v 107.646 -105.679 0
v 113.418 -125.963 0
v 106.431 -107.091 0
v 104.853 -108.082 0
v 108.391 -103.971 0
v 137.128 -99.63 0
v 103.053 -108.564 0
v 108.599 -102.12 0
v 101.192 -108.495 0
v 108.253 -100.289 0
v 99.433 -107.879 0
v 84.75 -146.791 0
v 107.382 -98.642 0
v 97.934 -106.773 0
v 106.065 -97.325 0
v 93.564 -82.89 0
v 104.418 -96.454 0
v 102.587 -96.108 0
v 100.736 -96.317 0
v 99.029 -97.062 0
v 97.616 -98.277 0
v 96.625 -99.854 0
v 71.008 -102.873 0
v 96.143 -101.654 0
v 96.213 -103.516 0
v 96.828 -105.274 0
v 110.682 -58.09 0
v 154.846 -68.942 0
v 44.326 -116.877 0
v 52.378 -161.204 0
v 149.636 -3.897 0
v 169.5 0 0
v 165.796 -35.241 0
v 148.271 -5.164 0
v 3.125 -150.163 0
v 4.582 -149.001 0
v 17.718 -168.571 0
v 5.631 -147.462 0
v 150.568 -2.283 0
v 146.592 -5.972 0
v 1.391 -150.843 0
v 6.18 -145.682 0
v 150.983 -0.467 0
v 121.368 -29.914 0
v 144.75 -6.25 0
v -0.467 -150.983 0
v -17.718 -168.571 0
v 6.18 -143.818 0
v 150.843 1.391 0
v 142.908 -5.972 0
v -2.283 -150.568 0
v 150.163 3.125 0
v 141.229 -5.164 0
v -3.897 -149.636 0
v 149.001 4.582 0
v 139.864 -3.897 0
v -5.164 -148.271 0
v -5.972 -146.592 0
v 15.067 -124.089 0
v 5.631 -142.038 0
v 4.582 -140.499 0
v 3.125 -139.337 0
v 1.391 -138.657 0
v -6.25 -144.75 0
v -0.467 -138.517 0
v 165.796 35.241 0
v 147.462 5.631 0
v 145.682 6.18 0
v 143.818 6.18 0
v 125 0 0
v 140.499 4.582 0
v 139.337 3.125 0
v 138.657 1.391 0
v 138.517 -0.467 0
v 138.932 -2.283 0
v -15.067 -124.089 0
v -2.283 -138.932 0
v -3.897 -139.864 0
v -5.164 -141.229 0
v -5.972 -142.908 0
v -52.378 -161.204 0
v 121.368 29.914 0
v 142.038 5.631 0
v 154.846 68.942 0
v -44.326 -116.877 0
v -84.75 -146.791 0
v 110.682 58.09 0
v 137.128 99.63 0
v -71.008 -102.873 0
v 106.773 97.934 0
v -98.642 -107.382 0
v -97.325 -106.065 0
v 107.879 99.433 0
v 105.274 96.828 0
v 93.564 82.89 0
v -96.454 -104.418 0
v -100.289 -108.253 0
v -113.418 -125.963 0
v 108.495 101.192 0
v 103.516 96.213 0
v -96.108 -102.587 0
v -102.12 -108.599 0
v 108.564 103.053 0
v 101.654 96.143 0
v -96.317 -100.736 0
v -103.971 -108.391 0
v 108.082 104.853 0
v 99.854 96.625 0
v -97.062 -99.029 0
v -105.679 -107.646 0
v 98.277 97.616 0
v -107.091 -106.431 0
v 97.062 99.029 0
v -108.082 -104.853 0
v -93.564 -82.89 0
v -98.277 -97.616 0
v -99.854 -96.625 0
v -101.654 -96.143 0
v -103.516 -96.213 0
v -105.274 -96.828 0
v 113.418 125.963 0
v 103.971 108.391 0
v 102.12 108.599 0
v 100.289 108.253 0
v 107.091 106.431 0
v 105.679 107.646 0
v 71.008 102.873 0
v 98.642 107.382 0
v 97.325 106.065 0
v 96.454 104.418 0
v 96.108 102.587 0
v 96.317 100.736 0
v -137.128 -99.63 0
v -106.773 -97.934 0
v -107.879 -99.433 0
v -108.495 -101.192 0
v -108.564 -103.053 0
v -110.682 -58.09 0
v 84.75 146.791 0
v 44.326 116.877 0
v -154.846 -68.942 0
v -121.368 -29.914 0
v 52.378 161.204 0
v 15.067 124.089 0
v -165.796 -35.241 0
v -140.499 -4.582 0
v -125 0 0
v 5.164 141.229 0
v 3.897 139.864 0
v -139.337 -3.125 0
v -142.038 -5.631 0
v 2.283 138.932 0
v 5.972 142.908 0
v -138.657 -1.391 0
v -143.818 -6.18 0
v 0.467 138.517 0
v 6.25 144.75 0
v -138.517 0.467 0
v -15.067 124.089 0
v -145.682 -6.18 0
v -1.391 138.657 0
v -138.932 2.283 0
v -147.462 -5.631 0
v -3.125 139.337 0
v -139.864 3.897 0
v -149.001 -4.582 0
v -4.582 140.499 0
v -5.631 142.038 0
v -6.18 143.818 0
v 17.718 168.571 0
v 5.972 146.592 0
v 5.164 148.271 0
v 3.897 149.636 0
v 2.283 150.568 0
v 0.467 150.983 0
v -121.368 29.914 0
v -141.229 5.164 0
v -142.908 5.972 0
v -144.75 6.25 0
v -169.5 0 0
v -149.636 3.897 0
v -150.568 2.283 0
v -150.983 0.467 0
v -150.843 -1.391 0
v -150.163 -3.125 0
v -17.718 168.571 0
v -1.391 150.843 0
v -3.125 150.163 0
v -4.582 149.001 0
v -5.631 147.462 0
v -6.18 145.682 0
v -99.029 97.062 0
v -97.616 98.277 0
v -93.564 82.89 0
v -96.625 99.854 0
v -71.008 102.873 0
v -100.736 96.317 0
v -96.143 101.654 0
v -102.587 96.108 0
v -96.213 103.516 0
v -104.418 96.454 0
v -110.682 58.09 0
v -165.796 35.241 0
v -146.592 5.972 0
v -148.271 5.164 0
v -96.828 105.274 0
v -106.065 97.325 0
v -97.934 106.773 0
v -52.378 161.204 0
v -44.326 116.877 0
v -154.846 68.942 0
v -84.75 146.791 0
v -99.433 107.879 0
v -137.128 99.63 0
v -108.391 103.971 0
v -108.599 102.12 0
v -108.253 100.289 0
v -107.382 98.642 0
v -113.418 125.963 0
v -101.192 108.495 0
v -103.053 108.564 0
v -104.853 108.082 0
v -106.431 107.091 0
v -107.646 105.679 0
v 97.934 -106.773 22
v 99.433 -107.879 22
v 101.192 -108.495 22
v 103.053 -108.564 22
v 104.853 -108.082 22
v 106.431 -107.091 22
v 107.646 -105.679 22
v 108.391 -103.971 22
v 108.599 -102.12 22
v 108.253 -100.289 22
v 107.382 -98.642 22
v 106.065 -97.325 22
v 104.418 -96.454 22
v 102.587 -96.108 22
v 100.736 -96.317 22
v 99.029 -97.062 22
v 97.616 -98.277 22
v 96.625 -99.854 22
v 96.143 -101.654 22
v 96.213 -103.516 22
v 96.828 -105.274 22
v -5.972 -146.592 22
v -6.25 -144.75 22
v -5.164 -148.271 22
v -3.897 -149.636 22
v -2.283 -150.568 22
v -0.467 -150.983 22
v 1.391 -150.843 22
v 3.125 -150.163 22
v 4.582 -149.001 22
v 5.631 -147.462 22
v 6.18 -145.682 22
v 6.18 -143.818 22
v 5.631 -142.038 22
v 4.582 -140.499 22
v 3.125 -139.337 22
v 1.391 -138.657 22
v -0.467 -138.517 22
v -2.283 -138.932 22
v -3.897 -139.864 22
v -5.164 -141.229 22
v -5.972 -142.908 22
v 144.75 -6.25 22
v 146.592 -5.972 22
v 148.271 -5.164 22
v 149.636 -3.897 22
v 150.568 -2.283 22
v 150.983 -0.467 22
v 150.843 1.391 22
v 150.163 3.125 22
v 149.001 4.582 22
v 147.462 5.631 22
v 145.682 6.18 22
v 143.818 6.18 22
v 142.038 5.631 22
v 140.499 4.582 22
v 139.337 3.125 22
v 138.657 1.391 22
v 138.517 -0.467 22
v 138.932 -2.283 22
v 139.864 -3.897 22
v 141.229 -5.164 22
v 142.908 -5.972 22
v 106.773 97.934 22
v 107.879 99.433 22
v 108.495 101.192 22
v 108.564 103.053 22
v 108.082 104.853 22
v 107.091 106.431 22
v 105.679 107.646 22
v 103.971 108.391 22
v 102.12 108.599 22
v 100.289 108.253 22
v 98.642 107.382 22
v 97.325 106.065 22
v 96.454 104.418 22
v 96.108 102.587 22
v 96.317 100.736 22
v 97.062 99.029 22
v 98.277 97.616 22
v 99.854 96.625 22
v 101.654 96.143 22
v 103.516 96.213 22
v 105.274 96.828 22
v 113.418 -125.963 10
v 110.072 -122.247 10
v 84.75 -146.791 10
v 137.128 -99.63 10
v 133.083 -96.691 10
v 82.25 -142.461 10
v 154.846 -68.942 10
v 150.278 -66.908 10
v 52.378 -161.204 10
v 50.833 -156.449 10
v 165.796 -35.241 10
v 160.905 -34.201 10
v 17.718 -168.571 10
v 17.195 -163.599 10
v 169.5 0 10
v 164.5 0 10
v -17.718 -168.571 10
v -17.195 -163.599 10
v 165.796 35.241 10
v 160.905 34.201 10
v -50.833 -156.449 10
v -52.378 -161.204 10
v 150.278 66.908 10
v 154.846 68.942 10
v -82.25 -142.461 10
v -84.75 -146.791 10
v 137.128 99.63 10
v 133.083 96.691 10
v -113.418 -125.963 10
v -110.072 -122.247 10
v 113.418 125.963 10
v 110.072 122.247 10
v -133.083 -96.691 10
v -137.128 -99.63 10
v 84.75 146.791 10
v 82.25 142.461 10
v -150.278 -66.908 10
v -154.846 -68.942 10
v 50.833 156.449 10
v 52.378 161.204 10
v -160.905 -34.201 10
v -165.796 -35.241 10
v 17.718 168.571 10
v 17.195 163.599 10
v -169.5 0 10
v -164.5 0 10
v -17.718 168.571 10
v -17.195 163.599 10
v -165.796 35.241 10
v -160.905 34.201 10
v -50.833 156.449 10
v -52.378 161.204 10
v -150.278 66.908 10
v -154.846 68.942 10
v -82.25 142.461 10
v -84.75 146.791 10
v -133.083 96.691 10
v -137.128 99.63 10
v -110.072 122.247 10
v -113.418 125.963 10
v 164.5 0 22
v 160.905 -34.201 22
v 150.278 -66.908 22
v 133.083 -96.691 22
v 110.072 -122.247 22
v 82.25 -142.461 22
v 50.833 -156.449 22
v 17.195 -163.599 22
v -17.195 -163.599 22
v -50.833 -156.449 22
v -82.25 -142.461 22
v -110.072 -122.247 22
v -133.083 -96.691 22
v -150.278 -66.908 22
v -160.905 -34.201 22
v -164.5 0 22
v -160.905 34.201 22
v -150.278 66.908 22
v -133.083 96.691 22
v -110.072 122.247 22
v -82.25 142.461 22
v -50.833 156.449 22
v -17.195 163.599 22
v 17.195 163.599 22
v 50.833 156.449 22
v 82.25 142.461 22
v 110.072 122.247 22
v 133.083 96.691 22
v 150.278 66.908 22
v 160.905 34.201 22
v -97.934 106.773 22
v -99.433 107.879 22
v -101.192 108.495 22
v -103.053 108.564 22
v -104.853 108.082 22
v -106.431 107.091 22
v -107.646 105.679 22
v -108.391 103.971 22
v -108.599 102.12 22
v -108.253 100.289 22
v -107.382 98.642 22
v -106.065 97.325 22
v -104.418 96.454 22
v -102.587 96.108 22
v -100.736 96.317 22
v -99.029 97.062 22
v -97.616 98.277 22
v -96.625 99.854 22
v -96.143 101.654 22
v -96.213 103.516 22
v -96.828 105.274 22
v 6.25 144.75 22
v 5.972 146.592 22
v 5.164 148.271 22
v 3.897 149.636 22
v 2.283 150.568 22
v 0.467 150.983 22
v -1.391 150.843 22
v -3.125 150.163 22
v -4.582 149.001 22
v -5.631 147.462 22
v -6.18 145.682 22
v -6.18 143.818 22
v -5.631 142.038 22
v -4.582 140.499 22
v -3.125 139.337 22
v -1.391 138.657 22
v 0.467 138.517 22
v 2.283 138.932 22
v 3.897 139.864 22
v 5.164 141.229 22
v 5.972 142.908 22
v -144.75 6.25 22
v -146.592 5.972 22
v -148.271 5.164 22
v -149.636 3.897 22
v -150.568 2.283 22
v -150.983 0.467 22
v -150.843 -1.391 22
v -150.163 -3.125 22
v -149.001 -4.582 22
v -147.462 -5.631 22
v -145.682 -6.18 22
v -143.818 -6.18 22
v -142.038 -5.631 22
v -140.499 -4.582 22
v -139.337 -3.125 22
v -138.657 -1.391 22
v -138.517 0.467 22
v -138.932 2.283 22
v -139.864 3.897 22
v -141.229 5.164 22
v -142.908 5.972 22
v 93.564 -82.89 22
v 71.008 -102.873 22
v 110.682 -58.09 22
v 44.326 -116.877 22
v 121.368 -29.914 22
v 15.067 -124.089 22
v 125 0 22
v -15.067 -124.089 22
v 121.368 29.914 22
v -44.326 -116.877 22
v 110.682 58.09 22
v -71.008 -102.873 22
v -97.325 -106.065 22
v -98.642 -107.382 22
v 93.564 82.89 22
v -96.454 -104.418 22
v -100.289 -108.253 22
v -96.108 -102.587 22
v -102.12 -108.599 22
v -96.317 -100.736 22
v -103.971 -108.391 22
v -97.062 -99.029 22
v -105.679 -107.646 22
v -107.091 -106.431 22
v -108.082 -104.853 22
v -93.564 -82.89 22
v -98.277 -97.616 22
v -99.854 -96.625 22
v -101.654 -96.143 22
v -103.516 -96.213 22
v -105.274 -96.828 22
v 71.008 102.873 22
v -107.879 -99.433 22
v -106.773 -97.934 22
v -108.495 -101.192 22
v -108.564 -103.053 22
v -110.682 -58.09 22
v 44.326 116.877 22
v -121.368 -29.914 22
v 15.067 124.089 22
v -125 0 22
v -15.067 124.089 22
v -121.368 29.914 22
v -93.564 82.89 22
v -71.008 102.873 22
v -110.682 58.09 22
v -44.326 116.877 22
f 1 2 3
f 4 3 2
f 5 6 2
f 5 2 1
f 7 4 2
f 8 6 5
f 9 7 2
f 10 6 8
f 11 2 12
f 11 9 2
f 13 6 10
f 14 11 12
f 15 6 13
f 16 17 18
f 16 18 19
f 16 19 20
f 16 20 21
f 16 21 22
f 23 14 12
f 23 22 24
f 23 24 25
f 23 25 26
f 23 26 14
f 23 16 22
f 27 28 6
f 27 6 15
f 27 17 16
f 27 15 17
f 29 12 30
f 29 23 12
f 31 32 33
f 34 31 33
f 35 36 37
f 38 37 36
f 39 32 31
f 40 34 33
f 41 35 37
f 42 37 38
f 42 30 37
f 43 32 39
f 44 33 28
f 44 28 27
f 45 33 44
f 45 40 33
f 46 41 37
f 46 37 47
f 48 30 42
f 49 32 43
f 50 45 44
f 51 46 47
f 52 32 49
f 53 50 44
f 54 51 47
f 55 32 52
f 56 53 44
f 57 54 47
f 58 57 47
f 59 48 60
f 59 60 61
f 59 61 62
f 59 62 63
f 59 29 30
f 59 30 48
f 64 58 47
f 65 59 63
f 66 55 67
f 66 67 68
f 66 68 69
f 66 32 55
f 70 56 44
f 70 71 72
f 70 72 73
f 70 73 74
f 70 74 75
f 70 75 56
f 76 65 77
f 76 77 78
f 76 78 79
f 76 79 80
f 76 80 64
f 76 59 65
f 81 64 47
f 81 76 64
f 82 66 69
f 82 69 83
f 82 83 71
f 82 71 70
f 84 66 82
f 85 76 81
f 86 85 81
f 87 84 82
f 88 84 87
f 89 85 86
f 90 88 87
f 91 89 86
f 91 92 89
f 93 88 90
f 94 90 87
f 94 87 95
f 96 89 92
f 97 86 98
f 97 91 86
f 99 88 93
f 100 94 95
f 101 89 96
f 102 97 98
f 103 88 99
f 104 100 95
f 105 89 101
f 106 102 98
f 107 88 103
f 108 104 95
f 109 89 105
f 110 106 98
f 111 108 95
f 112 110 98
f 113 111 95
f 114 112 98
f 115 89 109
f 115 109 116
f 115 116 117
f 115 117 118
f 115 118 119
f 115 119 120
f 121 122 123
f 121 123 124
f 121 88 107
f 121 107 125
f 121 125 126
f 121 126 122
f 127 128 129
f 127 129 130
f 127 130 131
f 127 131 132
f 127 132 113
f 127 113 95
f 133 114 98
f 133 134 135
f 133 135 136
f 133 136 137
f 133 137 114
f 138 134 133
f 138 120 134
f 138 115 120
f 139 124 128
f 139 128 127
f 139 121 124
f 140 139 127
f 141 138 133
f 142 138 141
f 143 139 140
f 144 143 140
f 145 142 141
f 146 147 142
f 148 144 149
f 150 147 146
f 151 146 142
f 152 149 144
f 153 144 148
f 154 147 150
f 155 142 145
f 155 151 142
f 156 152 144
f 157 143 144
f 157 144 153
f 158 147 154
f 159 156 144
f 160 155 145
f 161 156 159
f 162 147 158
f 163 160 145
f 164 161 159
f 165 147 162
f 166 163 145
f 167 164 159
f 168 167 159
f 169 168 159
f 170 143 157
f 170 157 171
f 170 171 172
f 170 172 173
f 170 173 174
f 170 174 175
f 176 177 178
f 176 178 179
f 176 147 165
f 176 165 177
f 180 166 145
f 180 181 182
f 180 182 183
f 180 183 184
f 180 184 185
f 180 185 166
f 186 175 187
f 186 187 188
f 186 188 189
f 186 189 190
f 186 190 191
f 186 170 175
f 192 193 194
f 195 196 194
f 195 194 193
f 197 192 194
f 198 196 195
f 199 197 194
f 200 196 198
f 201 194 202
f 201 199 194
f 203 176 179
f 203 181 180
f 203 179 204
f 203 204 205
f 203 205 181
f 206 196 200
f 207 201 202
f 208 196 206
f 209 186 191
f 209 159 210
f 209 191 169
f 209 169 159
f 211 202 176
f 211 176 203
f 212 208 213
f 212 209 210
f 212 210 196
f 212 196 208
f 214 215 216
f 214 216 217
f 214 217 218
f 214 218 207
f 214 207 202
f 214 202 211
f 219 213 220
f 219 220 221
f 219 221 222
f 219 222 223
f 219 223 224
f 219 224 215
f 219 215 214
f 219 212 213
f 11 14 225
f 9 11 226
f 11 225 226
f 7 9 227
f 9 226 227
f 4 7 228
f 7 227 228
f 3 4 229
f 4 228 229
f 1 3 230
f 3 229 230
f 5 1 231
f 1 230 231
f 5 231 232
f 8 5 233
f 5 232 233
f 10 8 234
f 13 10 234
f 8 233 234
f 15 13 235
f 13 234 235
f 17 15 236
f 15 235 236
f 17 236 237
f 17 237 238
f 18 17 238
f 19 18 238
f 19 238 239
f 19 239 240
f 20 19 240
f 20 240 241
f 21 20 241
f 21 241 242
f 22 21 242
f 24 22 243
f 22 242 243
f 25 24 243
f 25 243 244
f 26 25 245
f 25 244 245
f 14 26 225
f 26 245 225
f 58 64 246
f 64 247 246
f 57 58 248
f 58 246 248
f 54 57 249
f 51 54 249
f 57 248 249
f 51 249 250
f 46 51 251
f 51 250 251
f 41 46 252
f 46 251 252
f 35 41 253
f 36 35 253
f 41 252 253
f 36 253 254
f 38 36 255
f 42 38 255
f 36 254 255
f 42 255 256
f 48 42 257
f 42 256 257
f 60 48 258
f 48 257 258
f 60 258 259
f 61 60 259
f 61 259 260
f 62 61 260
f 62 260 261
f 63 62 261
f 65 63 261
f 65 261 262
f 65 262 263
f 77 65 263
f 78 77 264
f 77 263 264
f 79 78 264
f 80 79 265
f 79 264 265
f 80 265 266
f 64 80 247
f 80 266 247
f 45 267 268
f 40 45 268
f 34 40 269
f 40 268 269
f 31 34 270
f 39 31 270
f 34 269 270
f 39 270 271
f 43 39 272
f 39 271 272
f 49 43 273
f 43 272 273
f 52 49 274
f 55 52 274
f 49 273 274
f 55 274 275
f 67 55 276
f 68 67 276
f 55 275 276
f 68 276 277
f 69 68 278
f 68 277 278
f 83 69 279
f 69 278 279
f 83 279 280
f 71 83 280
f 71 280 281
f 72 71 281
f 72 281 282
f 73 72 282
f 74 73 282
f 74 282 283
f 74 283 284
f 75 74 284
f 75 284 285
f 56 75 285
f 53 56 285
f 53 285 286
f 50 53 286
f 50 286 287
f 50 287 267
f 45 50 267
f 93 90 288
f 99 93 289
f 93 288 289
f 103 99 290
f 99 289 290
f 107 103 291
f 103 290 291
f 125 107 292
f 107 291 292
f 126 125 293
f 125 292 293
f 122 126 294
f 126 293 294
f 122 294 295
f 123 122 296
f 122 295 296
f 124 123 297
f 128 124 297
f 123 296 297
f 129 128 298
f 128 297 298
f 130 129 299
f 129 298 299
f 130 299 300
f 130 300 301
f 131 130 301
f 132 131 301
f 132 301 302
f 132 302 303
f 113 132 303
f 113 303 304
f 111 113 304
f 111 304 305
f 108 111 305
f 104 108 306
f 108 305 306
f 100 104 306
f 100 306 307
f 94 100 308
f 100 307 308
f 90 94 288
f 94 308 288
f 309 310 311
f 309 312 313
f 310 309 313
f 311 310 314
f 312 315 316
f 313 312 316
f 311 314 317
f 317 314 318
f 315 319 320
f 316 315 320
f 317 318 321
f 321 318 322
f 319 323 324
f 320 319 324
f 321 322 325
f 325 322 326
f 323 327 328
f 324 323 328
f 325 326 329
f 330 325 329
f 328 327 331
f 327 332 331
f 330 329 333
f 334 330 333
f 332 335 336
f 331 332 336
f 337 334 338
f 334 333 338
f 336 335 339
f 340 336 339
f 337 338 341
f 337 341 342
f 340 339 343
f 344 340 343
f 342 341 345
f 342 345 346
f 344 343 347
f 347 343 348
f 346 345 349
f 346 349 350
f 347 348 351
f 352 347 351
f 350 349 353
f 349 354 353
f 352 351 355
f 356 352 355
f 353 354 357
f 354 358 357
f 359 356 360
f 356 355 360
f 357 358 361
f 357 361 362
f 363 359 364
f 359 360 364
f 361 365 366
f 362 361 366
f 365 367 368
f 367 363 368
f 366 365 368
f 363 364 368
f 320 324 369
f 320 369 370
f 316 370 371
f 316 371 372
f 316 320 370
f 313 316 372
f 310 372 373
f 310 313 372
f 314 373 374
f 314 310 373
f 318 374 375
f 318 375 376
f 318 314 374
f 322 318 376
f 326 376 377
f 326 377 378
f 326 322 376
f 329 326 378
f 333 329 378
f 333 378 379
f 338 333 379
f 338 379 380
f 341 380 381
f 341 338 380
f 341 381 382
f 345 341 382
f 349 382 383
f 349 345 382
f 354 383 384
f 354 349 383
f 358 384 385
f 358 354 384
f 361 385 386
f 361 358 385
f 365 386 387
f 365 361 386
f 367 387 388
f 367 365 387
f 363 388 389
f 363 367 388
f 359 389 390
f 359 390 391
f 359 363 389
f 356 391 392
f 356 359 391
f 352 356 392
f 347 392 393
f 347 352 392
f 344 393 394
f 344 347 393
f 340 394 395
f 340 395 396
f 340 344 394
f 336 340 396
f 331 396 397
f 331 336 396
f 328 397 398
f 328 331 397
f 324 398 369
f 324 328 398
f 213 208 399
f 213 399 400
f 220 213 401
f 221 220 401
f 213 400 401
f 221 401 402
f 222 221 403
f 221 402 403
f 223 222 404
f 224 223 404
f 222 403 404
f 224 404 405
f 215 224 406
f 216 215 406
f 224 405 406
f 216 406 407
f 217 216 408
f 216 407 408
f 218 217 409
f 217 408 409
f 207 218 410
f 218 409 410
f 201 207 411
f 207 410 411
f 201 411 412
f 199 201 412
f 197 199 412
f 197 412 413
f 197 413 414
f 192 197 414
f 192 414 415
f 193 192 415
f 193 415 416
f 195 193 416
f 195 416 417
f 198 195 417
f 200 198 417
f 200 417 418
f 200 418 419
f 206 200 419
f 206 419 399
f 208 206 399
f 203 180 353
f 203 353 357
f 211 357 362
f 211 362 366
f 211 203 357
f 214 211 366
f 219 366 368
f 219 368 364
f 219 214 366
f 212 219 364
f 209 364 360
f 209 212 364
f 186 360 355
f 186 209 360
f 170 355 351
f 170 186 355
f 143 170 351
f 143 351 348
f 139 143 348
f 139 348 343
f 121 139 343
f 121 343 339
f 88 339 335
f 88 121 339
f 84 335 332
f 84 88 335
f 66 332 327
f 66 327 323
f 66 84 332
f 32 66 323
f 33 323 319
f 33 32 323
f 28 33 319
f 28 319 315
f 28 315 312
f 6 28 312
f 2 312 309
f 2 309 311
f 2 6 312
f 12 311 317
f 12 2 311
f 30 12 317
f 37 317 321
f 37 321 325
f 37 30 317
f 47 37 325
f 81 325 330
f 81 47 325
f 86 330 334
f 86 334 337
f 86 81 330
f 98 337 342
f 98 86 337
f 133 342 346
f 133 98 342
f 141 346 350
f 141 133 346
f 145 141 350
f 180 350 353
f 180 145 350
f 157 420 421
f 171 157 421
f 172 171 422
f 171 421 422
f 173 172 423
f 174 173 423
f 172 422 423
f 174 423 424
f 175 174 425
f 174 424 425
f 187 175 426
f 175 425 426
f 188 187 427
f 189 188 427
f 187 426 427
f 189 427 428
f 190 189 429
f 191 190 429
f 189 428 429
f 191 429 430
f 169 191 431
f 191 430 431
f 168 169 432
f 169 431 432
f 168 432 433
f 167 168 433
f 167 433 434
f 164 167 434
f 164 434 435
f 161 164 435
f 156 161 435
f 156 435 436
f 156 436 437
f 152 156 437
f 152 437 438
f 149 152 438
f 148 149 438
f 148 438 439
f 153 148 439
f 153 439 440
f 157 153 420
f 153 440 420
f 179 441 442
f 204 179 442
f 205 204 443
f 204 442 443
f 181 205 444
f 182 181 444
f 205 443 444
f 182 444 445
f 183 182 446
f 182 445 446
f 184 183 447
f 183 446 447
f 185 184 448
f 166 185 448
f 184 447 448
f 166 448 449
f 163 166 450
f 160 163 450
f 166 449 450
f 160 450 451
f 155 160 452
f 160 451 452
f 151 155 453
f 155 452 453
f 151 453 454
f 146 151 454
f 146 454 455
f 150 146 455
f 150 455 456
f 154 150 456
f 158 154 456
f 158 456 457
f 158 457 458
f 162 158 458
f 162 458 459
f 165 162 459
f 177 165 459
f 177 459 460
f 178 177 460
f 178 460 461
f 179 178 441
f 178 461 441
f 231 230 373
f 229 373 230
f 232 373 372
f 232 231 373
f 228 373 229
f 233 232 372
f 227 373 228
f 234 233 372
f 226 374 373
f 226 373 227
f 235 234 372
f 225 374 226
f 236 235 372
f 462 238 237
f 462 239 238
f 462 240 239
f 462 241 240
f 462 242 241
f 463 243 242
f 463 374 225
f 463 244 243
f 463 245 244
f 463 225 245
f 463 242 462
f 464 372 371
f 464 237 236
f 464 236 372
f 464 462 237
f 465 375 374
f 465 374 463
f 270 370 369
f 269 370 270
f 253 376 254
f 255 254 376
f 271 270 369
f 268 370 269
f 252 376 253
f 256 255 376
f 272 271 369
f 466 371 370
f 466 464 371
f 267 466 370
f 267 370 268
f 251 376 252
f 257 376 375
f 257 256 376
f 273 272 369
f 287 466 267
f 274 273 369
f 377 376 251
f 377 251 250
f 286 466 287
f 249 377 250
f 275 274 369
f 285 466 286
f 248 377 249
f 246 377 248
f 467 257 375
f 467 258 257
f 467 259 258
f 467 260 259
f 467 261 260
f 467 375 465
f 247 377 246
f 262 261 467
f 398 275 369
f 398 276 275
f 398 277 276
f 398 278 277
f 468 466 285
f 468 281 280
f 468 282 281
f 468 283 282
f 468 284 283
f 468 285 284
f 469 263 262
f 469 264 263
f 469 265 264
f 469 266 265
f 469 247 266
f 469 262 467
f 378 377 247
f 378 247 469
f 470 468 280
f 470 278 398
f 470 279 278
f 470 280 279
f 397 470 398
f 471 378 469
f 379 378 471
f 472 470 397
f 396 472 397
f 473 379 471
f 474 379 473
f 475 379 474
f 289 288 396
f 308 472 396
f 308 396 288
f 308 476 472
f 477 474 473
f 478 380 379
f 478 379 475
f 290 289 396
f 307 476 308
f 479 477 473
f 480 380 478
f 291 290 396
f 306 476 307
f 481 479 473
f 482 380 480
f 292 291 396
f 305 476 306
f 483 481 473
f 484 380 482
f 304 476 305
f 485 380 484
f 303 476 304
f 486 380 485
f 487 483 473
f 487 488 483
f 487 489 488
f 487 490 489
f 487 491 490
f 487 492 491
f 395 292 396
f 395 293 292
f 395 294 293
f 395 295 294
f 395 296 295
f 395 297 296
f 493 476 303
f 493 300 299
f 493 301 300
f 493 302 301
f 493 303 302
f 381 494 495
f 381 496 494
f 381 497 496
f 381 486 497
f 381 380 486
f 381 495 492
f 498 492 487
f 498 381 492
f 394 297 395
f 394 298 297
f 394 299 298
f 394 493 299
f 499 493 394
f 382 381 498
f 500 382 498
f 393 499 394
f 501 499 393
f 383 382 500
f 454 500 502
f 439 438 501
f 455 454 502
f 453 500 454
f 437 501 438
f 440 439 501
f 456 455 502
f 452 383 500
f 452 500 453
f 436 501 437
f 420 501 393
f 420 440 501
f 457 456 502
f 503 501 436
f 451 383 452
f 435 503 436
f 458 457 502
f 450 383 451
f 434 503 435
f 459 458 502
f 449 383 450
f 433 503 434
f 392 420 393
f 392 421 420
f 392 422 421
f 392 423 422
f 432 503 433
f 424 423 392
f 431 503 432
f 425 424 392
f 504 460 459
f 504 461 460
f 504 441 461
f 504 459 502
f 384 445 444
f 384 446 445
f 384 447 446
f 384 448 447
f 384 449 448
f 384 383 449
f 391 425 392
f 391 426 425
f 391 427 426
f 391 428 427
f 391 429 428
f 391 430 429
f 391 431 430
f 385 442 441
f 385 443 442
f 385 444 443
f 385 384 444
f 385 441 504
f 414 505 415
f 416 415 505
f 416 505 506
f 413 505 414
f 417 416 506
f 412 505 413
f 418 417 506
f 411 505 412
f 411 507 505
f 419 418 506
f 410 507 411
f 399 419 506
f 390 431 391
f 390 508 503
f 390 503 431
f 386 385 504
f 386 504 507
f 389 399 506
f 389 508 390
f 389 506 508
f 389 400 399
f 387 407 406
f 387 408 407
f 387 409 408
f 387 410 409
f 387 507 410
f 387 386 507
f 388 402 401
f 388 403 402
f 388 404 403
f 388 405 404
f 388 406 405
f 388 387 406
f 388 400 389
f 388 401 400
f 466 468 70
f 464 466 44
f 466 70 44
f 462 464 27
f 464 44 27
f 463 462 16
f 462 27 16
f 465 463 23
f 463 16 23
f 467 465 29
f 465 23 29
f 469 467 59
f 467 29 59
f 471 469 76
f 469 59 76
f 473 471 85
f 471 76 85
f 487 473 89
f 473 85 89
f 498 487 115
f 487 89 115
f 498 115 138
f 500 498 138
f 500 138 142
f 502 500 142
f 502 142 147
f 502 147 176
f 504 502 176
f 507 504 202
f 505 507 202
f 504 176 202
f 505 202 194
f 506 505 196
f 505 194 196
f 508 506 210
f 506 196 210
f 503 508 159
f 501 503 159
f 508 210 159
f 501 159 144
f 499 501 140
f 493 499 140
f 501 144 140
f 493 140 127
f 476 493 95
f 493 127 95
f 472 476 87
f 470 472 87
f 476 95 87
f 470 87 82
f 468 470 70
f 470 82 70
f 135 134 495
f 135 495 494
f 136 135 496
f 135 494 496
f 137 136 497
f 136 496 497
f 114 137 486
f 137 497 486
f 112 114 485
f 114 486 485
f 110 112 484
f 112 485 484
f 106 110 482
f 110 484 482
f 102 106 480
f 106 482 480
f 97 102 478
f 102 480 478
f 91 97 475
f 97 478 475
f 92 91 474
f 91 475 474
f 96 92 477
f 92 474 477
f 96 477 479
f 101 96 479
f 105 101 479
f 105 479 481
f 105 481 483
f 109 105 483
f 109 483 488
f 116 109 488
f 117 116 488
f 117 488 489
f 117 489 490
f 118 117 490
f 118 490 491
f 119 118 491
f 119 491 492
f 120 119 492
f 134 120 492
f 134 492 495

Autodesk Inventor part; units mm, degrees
ref_plane "YZ Plane" through (0, 0, 0) normal (1, 0, 0) x (0, 1, 0)
ref_plane "XZ Plane" through (0, 0, 0) normal (0, 1, 0) x (-1, 0, 0)
ref_plane "XY Plane" through (0, 0, 0) normal (0, 0, 1) x (1, 0, 0)
sketch "Sketch1" plane through (0, 0, 0) normal (0, 0, 1) x (1, 0, 0)
  circle A0 centre (0, 0) radius 125
  circle A1 centre (0, 0) radius 164.5
  dimension "d0" = 39.5
  dimension "d1" = 250
extrude "Extrusion1" add sketch "Sketch1" along normal blind 41
sketch "Sketch2" plane through (0, 0, 41) normal (0, 0, 1) x (1, 0, 0)
  circle A0 centre (0, 0) radius 164.5 construction
  circle A1 centre (0, 0) radius 125 construction
  line L0 (0, 164.5) -> (0, 125) construction
  circle A2 centre (0, 144.75) radius 6.25
  dimension "d4" = 12.5
extrude "Extrusion2" cut sketch "Sketch2" against normal through all
sketch "Sketch3" plane through (0, 0, 41) normal (0, 0, 1) x (1, 0, 0)
  circle A0 centre (0, 144.75) radius 6.25 projected
  circle A1 centre (0, 144.75) radius 13.75
  point P0 (0, 0)
  dimension "d10" = 27.5
extrude "Extrusion3" cut sketch "Sketch3" against normal blind 11
pattern_circular "Circular Pattern1" count 8 over 360 about axis through (0, 0, 0) along (0, 0, 1) of "Extrusion2", "Extrusion3"
sketch "Sketch4" plane through (0, 0, 0) normal (0, 0, -1) x (-1, 0, 0)
  circle A0 centre (0, 0) radius 164.5 projected
  circle A1 centre (0, 0) radius 169.5
  dimension "d13" = 5
extrude "Extrusion4" add sketch "Sketch4" against normal blind 10
sketch "Sketch5" plane through (0, 0, 0) normal (1, 0, 0) x (0, 1, 0)
  line L0 (164.5, 10) -> (-164.5, 10) projected
  line L1 (164.5, 41) -> (-164.5, 41) projected
  line L2 (169.5, 10) -> (-169.5, 10) projected
  line L3 (-169.5, 0) -> (169.5, 0) projected
  line L4 (164.5, 41) -> (164.5, 10)
  line L5 (164.5, 10) -> (164.5, 41) projected
  line L6 (169.5, 10) -> (169.5, 0)
  line L7 (-164.5, 41) -> (-164.5, 10)
  line L8 (-169.5, 10) -> (-169.5, 0)
  line L9 (-164.5, 22) -> (164.5, 22)
  point P0 (0, 0)
  point P1 (164.5, 22)
  dimension "d16" = 19
  dimension "d17" = 41
extrude "Extrusion5" cut sketch "Sketch5" along normal through all both and the other way through all contours L9 L7 L1 L4
equation "\"d1\" = Вал_ось_диаметр_НОС"
equation "\"BendRadius\" = Thickness"
equation "\"BendReliefWidth\" = Thickness"
equation "\"BendReliefDepth\" = 0.5 * Thickness"
equation "\"CornerReliefSize\" = 4 * Thickness"
equation "\"MinimumRemnant\" = 2 * Thickness"
equation "\"TransitionRadius\" = BendRadius"
equation "\"JacobiRadiusSize\" = BendRadius"
equation "\"GapSize\" = Thickness"
equation "\"Вал_ось_диаметр_НОС\" = 250"
equation "\"Thickness\" = 19"
properties part number "ДМФ 01 31.1 Барабан Опорное кольцо НОС"
